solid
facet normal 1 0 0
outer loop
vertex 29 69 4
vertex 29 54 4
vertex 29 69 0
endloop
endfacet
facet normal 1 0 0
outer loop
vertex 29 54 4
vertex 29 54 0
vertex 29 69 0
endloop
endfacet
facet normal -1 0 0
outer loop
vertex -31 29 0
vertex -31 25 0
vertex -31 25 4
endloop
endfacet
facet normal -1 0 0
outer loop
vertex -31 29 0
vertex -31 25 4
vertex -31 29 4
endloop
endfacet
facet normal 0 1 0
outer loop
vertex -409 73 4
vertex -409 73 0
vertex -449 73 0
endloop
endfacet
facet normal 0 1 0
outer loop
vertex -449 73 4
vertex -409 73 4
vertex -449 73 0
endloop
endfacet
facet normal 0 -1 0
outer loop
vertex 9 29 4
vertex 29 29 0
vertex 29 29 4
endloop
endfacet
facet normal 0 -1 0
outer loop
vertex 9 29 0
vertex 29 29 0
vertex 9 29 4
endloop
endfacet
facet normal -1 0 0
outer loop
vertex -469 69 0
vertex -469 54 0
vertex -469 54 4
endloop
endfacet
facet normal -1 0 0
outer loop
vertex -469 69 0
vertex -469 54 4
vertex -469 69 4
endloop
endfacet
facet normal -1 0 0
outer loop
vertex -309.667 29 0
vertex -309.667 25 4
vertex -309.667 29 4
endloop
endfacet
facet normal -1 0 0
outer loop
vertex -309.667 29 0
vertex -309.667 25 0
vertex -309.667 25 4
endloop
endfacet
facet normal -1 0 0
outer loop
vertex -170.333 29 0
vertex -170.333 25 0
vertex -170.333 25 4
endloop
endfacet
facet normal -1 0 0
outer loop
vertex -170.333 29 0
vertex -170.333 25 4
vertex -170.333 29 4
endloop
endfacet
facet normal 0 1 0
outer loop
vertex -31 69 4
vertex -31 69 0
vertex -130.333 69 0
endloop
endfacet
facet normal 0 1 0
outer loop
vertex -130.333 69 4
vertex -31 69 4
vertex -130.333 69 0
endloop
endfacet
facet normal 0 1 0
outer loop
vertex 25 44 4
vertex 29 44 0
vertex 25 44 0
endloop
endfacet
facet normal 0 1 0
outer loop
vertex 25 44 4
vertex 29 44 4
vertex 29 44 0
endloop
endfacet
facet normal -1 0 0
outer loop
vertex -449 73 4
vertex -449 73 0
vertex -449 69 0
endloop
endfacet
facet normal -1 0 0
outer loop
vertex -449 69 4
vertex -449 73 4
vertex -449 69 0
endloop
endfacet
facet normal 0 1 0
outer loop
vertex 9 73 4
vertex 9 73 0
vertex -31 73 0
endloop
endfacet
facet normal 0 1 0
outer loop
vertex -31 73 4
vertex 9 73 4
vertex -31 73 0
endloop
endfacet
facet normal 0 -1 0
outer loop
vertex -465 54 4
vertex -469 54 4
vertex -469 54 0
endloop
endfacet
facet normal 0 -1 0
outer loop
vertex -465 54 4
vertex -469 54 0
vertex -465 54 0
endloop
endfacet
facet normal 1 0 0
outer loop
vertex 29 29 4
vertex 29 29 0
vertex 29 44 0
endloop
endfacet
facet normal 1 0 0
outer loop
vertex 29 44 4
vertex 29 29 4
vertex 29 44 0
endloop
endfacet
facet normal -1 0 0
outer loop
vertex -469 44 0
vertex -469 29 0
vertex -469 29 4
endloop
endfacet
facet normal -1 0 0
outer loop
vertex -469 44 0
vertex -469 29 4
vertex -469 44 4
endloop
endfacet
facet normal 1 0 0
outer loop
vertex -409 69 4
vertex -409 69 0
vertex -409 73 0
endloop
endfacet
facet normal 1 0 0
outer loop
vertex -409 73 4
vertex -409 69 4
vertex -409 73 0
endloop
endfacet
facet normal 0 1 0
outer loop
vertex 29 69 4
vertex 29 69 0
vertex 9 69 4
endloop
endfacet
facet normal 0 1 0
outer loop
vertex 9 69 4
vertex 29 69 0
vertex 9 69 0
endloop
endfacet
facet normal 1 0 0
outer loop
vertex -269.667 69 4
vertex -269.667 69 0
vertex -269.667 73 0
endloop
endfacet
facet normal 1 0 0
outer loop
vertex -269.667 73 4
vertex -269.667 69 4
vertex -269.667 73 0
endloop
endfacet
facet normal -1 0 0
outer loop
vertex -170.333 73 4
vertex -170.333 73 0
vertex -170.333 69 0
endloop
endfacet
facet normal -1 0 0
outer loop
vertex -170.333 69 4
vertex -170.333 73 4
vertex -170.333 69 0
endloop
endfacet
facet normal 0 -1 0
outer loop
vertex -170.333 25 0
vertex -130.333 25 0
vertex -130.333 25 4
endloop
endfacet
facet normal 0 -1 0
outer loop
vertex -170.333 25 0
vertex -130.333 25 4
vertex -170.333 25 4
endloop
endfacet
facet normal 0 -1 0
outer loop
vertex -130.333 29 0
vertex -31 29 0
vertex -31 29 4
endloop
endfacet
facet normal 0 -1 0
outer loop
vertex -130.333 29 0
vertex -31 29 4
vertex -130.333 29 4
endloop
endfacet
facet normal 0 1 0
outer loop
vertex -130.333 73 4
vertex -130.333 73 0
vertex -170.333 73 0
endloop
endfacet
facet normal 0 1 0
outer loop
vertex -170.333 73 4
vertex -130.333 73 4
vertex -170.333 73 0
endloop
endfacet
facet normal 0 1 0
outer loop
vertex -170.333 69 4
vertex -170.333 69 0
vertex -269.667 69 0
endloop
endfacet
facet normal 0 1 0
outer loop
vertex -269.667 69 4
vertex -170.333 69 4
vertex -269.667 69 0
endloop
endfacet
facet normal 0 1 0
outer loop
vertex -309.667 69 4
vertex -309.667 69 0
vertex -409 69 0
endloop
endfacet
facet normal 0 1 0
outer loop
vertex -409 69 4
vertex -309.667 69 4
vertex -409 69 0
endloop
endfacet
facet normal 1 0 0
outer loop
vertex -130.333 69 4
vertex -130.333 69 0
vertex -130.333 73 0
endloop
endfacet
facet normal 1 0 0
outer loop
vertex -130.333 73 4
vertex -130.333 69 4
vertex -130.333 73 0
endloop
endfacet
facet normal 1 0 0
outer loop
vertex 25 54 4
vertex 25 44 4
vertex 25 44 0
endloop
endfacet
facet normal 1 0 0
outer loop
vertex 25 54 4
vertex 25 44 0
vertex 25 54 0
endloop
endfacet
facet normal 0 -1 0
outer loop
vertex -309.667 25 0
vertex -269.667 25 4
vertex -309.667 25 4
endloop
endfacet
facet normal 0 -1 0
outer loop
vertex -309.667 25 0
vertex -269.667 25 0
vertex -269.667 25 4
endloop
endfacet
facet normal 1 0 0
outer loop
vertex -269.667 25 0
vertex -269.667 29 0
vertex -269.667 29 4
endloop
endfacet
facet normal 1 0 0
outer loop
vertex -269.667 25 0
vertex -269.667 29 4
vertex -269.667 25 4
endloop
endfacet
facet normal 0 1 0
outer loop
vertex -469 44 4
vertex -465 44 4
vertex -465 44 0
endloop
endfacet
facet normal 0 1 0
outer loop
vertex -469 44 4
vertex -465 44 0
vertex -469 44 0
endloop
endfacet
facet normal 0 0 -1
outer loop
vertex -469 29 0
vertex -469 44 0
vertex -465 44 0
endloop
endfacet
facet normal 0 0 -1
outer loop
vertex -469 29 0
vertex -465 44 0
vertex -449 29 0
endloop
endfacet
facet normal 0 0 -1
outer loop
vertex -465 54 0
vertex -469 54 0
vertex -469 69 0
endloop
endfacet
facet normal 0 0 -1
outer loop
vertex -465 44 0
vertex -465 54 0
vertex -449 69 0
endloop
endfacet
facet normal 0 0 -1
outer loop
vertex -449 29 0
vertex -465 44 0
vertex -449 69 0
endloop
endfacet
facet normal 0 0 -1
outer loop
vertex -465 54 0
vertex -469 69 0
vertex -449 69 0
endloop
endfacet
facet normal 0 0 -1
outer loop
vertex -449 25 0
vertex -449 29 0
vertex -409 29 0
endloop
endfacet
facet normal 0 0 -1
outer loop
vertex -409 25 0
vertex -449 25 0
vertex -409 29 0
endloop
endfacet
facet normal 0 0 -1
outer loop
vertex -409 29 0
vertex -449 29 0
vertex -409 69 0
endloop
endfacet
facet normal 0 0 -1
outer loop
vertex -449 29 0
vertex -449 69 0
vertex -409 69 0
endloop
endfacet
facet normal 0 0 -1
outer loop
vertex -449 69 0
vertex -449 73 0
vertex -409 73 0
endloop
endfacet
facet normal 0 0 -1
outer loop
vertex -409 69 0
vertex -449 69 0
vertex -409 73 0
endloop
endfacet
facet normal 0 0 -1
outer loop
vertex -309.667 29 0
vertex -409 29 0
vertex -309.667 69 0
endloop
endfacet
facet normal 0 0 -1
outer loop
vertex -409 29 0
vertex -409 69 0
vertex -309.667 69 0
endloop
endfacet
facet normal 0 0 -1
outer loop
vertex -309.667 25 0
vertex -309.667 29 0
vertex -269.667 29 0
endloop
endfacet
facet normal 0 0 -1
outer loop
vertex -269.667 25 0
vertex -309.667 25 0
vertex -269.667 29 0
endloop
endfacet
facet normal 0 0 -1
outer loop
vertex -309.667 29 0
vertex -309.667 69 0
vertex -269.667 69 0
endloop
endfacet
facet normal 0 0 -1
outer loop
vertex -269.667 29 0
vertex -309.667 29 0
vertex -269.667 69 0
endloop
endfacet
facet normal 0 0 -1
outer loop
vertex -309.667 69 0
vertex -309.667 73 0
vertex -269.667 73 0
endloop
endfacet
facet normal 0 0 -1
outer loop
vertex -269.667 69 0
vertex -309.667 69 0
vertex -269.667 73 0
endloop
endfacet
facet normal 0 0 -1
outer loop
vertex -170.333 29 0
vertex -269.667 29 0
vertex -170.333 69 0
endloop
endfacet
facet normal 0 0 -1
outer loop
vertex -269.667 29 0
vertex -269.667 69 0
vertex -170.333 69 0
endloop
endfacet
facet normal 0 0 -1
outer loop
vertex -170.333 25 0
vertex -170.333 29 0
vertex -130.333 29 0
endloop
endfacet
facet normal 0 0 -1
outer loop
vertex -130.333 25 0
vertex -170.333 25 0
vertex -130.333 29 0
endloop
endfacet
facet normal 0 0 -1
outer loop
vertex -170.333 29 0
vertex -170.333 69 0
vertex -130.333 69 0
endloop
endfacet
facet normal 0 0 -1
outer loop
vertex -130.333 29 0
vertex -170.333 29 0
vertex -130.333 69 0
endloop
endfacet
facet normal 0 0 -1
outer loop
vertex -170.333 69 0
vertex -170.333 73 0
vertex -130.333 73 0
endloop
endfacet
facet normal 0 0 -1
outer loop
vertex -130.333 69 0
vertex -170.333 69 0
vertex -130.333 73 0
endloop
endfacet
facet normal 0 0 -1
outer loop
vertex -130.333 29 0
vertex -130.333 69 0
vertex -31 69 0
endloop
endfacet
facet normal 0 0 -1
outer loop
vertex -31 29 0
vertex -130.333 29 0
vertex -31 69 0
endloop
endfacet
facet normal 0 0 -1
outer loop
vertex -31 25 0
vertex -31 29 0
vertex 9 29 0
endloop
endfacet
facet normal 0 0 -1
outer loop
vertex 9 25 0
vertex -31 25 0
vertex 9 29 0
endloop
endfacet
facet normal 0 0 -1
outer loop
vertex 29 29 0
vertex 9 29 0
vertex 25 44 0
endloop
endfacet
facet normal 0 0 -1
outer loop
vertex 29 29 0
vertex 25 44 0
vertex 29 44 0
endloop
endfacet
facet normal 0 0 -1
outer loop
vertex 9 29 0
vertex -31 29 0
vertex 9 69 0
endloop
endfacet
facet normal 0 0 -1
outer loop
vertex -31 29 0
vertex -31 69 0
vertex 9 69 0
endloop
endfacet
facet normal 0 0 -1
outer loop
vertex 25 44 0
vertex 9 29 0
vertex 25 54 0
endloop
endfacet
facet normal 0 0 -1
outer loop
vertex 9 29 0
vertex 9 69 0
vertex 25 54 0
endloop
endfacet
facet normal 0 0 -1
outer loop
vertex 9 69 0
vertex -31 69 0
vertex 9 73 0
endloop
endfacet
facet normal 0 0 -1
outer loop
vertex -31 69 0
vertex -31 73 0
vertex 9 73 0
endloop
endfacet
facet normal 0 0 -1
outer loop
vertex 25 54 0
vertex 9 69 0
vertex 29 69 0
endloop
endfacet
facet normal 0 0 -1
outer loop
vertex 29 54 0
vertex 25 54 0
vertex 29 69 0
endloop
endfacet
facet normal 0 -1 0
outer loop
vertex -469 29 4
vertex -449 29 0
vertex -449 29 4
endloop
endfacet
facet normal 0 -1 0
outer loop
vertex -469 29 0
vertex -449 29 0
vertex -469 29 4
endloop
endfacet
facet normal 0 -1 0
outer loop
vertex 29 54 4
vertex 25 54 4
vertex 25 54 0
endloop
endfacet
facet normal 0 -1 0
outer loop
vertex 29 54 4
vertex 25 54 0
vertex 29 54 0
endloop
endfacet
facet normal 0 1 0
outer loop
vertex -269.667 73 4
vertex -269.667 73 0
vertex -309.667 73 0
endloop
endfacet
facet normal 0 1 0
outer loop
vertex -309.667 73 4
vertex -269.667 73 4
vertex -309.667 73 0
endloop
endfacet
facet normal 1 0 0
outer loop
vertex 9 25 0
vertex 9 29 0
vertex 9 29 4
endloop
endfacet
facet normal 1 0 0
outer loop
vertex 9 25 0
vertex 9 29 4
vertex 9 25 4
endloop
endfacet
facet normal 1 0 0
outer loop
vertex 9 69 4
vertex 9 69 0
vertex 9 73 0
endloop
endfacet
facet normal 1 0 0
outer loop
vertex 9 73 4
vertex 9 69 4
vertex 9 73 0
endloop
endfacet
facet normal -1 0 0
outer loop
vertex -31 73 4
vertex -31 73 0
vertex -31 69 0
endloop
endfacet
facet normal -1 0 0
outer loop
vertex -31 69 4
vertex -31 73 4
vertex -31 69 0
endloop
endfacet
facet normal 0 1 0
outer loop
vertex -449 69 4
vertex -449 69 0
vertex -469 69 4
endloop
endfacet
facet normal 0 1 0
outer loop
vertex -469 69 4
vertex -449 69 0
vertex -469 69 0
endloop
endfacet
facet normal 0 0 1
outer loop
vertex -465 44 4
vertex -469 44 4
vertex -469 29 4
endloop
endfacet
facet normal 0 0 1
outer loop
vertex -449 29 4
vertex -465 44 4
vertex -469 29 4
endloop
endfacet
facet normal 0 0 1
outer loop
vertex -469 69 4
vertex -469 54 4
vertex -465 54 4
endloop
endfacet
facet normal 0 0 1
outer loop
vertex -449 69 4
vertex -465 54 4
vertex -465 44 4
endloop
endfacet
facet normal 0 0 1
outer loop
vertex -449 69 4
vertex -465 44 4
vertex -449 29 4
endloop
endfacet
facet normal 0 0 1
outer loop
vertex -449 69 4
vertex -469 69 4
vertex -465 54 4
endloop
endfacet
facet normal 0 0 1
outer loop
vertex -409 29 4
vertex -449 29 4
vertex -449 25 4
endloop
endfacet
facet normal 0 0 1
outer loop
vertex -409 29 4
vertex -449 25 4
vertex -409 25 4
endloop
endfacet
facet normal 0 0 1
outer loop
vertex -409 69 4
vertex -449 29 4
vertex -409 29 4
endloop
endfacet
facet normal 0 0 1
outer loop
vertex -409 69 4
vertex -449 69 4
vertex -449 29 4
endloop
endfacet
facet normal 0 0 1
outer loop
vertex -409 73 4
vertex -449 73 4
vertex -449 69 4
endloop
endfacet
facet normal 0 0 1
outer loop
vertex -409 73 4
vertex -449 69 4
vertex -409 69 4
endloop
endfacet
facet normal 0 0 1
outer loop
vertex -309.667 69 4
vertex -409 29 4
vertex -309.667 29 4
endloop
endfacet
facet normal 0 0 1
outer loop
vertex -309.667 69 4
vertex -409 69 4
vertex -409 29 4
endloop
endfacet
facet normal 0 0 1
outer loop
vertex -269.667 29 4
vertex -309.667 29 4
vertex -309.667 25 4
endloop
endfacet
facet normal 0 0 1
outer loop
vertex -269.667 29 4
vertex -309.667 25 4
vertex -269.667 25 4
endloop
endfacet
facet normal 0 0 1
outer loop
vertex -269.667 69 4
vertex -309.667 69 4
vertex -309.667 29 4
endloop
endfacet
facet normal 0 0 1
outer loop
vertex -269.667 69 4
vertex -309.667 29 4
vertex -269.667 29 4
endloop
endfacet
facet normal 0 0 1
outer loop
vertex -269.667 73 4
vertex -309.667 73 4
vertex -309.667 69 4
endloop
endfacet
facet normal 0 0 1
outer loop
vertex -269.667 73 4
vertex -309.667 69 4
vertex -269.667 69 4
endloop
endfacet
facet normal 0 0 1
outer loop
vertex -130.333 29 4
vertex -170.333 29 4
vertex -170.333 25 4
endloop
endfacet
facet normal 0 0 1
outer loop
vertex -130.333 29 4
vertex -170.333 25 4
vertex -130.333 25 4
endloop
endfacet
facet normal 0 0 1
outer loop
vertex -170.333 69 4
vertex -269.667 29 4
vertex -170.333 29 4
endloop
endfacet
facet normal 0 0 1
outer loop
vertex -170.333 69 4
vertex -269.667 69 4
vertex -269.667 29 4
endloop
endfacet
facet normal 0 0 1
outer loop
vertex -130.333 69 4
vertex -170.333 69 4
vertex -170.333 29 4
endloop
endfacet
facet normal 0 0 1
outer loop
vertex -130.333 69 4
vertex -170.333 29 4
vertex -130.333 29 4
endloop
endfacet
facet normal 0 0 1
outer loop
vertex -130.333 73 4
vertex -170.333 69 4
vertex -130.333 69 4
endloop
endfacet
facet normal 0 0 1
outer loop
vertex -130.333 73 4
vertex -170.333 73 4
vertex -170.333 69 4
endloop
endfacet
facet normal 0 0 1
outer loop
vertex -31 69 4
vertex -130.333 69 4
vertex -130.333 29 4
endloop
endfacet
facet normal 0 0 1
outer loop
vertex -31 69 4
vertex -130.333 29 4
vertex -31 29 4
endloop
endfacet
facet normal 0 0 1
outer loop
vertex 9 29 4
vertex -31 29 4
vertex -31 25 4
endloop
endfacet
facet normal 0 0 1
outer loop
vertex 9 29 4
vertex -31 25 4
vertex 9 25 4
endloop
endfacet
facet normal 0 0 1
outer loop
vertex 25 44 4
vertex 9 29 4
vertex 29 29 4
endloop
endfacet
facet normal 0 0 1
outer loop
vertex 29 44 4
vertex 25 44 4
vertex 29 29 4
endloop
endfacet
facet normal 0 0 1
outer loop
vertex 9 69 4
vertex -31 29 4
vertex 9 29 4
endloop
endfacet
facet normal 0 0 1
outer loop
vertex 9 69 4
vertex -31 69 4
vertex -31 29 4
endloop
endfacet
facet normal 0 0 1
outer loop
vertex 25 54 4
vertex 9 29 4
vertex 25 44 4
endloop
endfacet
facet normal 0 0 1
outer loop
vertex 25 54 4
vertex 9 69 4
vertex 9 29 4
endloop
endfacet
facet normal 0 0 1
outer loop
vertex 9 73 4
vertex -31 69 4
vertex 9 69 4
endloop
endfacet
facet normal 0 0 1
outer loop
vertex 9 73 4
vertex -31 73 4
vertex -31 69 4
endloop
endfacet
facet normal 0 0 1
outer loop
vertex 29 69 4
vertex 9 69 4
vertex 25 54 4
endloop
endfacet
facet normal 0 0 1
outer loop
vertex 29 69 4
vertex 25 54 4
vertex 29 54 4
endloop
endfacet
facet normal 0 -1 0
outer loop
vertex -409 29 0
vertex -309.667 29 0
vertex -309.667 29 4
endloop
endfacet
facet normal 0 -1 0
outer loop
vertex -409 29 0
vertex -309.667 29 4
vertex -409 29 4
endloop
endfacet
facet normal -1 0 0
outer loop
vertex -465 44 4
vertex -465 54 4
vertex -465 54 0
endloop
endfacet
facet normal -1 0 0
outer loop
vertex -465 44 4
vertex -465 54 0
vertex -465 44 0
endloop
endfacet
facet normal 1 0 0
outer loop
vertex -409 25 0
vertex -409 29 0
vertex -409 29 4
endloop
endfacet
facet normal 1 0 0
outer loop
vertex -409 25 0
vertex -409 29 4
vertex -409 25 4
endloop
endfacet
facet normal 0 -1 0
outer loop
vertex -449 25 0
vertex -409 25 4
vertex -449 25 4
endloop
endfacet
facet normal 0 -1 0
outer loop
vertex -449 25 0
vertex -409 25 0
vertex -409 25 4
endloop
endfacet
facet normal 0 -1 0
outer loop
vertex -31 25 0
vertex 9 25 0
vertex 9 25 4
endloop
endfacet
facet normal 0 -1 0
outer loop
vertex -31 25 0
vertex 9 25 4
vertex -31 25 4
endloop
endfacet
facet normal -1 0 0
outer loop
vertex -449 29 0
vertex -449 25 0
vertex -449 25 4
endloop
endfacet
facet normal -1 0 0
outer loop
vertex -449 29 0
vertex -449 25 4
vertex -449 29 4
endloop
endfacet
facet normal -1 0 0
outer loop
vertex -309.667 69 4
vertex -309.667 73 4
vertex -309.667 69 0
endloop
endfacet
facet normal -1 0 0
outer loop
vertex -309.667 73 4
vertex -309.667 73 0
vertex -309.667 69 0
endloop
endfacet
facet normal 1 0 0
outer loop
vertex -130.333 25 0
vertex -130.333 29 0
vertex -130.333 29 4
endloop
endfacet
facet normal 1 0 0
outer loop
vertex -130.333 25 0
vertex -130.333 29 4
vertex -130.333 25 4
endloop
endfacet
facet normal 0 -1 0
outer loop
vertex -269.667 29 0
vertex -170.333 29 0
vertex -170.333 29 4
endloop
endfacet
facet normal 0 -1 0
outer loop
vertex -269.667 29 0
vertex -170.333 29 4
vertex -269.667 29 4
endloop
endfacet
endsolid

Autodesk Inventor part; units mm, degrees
ref_plane "YZ Plane" through (0, 0, 0) normal (1, 0, 0) x (0, 1, 0)
ref_plane "XZ Plane" through (0, 0, 0) normal (0, 1, 0) x (-1, 0, 0)
sketch "Sketch1" plane through (0, 0, 0) normal (0, 0, 1) x (1, 0, 0)
  line L0 (29, 29) -> (9, 29)
  line L1 (9, 29) -> (9, 25)
  line L2 (9, 25) -> (-31, 25)
  line L3 (-31, 25) -> (-31, 29)
  line L4 (-31, 29) -> (-130.3333, 29)
  line L5 (-130.3333, 29) -> (-130.3333, 25)
  line L6 (-130.3333, 25) -> (-170.3333, 25)
  line L7 (-170.3333, 25) -> (-170.3333, 29)
  line L8 (-170.3333, 29) -> (-269.6667, 29)
  line L9 (-269.6667, 29) -> (-269.6667, 25)
  line L10 (-269.6667, 25) -> (-309.6667, 25)
  line L11 (-309.6667, 25) -> (-309.6667, 29)
  line L12 (-309.6667, 29) -> (-409, 29)
  line L13 (-409, 29) -> (-409, 25)
  line L14 (-409, 25) -> (-449, 25)
  line L15 (-449, 25) -> (-449, 29)
  line L16 (-449, 29) -> (-469, 29)
  line L17 (29, 29) -> (29, 69)
  line L18 (-469, 29) -> (-469, 69)
  line L19 (-469, 49) -> (-556.7501, 49)
  line L20 (9, 69) -> (9, 73)
  line L21 (9, 73) -> (-31, 73)
  line L22 (-31, 73) -> (-31, 69)
  line L23 (-130.3333, 69) -> (-130.3333, 73)
  line L24 (-130.3333, 73) -> (-170.3333, 73)
  line L25 (-409, 73) -> (-449, 73)
  line L26 (-449, 73) -> (-449, 69)
  line L27 (-409, 69) -> (-409, 73)
  line L28 (-309.6667, 73) -> (-309.6667, 69)
  line L29 (-170.3333, 73) -> (-170.3333, 69)
  line L30 (-269.6667, 69) -> (-269.6667, 73)
  line L31 (-269.6667, 73) -> (-309.6667, 73)
  line L32 (-170.3333, 69) -> (-269.6667, 69)
  line L33 (29, 69) -> (9, 69)
  line L34 (-31, 69) -> (-130.3333, 69)
  line L35 (-309.6667, 69) -> (-409, 69)
  line L36 (-449, 69) -> (-469, 69)
  point P0 (0, 0)
  dimension "d0" = 40
  dimension "d1" = 40
  dimension "d2" = 40
  dimension "d3" = 40
  dimension "d4" = 40
  dimension "d5" = 498
  dimension "d6" = 40
extrude "Extrusion1" add sketch "Sketch1" along normal blind 4
sketch "Sketch3" plane through (0, 0, 4) normal (0, 0, 1) x (1, 0, 0)
  line L0 (9, 25) -> (9, 29) projected
  line L1 (9, 29) -> (29, 29) projected
  line L2 (29, 29) -> (29, 69) projected
  line L3 (29, 69) -> (9, 69) projected
  line L4 (9, 69) -> (9, 73) projected
  line L5 (9, 73) -> (-31, 73) projected
  line L6 (-31, 73) -> (-31, 69) projected
  line L7 (-31, 69) -> (-130.3333, 69) projected
  line L8 (-130.3333, 69) -> (-130.3333, 73) projected
  line L9 (-130.3333, 73) -> (-170.3333, 73) projected
  line L10 (-170.3333, 73) -> (-170.3333, 69) projected
  line L11 (-170.3333, 69) -> (-269.6667, 69) projected
  line L12 (-269.6667, 69) -> (-269.6667, 73) projected
  line L13 (-269.6667, 73) -> (-309.6667, 73) projected
  line L14 (-309.6667, 73) -> (-309.6667, 69) projected
  line L15 (-309.6667, 69) -> (-409, 69) projected
  line L16 (-409, 69) -> (-409, 73) projected
  line L17 (-409, 73) -> (-449, 73) projected
  line L18 (-449, 73) -> (-449, 69) projected
  line L19 (-449, 69) -> (-469, 69) projected
  line L20 (-469, 69) -> (-469, 29) projected
  line L21 (-469, 29) -> (-449, 29) projected
  line L22 (-449, 29) -> (-449, 25) projected
  line L23 (-449, 25) -> (-409, 25) projected
  line L24 (-409, 25) -> (-409, 29) projected
  line L25 (-409, 29) -> (-309.6667, 29) projected
  line L26 (-309.6667, 29) -> (-309.6667, 25) projected
  line L27 (-309.6667, 25) -> (-269.6667, 25) projected
  line L28 (-269.6667, 25) -> (-269.6667, 29) projected
  line L29 (-269.6667, 29) -> (-170.3333, 29) projected
  line L30 (-170.3333, 29) -> (-170.3333, 25) projected
  line L31 (-170.3333, 25) -> (-130.3333, 25) projected
  line L32 (-130.3333, 25) -> (-130.3333, 29) projected
  line L33 (-130.3333, 29) -> (-31, 29) projected
  line L34 (-31, 29) -> (-31, 25) projected
  line L35 (-31, 25) -> (9, 25) projected
  line L36 (-234.0151, 149.1478) -> (-234.0151, 116.0125)
  line L37 (25, 54) -> (29, 54)
  line L38 (29, 54) -> (29, 44)
  line L39 (29, 44) -> (25, 44)
  line L40 (25, 44) -> (25, 54)
  point P0 (0, 0)
  point P1 (29, 49)
  dimension "d15" = 498
  dimension "d16" = 4
  dimension "d17" = 10
extrude "Extrusion3" cut sketch "Sketch3" against normal blind 4 contours L39 L40 L37 L2
ref_plane "Work Plane2" through (-220, 69, 4) normal (1, 0, 0) x (0, 0, -1)
mirror "Mirror1" about plane through (-220, 69, 4) normal (1, 0, 0) of "Extrusion3"
properties part number "F1"
